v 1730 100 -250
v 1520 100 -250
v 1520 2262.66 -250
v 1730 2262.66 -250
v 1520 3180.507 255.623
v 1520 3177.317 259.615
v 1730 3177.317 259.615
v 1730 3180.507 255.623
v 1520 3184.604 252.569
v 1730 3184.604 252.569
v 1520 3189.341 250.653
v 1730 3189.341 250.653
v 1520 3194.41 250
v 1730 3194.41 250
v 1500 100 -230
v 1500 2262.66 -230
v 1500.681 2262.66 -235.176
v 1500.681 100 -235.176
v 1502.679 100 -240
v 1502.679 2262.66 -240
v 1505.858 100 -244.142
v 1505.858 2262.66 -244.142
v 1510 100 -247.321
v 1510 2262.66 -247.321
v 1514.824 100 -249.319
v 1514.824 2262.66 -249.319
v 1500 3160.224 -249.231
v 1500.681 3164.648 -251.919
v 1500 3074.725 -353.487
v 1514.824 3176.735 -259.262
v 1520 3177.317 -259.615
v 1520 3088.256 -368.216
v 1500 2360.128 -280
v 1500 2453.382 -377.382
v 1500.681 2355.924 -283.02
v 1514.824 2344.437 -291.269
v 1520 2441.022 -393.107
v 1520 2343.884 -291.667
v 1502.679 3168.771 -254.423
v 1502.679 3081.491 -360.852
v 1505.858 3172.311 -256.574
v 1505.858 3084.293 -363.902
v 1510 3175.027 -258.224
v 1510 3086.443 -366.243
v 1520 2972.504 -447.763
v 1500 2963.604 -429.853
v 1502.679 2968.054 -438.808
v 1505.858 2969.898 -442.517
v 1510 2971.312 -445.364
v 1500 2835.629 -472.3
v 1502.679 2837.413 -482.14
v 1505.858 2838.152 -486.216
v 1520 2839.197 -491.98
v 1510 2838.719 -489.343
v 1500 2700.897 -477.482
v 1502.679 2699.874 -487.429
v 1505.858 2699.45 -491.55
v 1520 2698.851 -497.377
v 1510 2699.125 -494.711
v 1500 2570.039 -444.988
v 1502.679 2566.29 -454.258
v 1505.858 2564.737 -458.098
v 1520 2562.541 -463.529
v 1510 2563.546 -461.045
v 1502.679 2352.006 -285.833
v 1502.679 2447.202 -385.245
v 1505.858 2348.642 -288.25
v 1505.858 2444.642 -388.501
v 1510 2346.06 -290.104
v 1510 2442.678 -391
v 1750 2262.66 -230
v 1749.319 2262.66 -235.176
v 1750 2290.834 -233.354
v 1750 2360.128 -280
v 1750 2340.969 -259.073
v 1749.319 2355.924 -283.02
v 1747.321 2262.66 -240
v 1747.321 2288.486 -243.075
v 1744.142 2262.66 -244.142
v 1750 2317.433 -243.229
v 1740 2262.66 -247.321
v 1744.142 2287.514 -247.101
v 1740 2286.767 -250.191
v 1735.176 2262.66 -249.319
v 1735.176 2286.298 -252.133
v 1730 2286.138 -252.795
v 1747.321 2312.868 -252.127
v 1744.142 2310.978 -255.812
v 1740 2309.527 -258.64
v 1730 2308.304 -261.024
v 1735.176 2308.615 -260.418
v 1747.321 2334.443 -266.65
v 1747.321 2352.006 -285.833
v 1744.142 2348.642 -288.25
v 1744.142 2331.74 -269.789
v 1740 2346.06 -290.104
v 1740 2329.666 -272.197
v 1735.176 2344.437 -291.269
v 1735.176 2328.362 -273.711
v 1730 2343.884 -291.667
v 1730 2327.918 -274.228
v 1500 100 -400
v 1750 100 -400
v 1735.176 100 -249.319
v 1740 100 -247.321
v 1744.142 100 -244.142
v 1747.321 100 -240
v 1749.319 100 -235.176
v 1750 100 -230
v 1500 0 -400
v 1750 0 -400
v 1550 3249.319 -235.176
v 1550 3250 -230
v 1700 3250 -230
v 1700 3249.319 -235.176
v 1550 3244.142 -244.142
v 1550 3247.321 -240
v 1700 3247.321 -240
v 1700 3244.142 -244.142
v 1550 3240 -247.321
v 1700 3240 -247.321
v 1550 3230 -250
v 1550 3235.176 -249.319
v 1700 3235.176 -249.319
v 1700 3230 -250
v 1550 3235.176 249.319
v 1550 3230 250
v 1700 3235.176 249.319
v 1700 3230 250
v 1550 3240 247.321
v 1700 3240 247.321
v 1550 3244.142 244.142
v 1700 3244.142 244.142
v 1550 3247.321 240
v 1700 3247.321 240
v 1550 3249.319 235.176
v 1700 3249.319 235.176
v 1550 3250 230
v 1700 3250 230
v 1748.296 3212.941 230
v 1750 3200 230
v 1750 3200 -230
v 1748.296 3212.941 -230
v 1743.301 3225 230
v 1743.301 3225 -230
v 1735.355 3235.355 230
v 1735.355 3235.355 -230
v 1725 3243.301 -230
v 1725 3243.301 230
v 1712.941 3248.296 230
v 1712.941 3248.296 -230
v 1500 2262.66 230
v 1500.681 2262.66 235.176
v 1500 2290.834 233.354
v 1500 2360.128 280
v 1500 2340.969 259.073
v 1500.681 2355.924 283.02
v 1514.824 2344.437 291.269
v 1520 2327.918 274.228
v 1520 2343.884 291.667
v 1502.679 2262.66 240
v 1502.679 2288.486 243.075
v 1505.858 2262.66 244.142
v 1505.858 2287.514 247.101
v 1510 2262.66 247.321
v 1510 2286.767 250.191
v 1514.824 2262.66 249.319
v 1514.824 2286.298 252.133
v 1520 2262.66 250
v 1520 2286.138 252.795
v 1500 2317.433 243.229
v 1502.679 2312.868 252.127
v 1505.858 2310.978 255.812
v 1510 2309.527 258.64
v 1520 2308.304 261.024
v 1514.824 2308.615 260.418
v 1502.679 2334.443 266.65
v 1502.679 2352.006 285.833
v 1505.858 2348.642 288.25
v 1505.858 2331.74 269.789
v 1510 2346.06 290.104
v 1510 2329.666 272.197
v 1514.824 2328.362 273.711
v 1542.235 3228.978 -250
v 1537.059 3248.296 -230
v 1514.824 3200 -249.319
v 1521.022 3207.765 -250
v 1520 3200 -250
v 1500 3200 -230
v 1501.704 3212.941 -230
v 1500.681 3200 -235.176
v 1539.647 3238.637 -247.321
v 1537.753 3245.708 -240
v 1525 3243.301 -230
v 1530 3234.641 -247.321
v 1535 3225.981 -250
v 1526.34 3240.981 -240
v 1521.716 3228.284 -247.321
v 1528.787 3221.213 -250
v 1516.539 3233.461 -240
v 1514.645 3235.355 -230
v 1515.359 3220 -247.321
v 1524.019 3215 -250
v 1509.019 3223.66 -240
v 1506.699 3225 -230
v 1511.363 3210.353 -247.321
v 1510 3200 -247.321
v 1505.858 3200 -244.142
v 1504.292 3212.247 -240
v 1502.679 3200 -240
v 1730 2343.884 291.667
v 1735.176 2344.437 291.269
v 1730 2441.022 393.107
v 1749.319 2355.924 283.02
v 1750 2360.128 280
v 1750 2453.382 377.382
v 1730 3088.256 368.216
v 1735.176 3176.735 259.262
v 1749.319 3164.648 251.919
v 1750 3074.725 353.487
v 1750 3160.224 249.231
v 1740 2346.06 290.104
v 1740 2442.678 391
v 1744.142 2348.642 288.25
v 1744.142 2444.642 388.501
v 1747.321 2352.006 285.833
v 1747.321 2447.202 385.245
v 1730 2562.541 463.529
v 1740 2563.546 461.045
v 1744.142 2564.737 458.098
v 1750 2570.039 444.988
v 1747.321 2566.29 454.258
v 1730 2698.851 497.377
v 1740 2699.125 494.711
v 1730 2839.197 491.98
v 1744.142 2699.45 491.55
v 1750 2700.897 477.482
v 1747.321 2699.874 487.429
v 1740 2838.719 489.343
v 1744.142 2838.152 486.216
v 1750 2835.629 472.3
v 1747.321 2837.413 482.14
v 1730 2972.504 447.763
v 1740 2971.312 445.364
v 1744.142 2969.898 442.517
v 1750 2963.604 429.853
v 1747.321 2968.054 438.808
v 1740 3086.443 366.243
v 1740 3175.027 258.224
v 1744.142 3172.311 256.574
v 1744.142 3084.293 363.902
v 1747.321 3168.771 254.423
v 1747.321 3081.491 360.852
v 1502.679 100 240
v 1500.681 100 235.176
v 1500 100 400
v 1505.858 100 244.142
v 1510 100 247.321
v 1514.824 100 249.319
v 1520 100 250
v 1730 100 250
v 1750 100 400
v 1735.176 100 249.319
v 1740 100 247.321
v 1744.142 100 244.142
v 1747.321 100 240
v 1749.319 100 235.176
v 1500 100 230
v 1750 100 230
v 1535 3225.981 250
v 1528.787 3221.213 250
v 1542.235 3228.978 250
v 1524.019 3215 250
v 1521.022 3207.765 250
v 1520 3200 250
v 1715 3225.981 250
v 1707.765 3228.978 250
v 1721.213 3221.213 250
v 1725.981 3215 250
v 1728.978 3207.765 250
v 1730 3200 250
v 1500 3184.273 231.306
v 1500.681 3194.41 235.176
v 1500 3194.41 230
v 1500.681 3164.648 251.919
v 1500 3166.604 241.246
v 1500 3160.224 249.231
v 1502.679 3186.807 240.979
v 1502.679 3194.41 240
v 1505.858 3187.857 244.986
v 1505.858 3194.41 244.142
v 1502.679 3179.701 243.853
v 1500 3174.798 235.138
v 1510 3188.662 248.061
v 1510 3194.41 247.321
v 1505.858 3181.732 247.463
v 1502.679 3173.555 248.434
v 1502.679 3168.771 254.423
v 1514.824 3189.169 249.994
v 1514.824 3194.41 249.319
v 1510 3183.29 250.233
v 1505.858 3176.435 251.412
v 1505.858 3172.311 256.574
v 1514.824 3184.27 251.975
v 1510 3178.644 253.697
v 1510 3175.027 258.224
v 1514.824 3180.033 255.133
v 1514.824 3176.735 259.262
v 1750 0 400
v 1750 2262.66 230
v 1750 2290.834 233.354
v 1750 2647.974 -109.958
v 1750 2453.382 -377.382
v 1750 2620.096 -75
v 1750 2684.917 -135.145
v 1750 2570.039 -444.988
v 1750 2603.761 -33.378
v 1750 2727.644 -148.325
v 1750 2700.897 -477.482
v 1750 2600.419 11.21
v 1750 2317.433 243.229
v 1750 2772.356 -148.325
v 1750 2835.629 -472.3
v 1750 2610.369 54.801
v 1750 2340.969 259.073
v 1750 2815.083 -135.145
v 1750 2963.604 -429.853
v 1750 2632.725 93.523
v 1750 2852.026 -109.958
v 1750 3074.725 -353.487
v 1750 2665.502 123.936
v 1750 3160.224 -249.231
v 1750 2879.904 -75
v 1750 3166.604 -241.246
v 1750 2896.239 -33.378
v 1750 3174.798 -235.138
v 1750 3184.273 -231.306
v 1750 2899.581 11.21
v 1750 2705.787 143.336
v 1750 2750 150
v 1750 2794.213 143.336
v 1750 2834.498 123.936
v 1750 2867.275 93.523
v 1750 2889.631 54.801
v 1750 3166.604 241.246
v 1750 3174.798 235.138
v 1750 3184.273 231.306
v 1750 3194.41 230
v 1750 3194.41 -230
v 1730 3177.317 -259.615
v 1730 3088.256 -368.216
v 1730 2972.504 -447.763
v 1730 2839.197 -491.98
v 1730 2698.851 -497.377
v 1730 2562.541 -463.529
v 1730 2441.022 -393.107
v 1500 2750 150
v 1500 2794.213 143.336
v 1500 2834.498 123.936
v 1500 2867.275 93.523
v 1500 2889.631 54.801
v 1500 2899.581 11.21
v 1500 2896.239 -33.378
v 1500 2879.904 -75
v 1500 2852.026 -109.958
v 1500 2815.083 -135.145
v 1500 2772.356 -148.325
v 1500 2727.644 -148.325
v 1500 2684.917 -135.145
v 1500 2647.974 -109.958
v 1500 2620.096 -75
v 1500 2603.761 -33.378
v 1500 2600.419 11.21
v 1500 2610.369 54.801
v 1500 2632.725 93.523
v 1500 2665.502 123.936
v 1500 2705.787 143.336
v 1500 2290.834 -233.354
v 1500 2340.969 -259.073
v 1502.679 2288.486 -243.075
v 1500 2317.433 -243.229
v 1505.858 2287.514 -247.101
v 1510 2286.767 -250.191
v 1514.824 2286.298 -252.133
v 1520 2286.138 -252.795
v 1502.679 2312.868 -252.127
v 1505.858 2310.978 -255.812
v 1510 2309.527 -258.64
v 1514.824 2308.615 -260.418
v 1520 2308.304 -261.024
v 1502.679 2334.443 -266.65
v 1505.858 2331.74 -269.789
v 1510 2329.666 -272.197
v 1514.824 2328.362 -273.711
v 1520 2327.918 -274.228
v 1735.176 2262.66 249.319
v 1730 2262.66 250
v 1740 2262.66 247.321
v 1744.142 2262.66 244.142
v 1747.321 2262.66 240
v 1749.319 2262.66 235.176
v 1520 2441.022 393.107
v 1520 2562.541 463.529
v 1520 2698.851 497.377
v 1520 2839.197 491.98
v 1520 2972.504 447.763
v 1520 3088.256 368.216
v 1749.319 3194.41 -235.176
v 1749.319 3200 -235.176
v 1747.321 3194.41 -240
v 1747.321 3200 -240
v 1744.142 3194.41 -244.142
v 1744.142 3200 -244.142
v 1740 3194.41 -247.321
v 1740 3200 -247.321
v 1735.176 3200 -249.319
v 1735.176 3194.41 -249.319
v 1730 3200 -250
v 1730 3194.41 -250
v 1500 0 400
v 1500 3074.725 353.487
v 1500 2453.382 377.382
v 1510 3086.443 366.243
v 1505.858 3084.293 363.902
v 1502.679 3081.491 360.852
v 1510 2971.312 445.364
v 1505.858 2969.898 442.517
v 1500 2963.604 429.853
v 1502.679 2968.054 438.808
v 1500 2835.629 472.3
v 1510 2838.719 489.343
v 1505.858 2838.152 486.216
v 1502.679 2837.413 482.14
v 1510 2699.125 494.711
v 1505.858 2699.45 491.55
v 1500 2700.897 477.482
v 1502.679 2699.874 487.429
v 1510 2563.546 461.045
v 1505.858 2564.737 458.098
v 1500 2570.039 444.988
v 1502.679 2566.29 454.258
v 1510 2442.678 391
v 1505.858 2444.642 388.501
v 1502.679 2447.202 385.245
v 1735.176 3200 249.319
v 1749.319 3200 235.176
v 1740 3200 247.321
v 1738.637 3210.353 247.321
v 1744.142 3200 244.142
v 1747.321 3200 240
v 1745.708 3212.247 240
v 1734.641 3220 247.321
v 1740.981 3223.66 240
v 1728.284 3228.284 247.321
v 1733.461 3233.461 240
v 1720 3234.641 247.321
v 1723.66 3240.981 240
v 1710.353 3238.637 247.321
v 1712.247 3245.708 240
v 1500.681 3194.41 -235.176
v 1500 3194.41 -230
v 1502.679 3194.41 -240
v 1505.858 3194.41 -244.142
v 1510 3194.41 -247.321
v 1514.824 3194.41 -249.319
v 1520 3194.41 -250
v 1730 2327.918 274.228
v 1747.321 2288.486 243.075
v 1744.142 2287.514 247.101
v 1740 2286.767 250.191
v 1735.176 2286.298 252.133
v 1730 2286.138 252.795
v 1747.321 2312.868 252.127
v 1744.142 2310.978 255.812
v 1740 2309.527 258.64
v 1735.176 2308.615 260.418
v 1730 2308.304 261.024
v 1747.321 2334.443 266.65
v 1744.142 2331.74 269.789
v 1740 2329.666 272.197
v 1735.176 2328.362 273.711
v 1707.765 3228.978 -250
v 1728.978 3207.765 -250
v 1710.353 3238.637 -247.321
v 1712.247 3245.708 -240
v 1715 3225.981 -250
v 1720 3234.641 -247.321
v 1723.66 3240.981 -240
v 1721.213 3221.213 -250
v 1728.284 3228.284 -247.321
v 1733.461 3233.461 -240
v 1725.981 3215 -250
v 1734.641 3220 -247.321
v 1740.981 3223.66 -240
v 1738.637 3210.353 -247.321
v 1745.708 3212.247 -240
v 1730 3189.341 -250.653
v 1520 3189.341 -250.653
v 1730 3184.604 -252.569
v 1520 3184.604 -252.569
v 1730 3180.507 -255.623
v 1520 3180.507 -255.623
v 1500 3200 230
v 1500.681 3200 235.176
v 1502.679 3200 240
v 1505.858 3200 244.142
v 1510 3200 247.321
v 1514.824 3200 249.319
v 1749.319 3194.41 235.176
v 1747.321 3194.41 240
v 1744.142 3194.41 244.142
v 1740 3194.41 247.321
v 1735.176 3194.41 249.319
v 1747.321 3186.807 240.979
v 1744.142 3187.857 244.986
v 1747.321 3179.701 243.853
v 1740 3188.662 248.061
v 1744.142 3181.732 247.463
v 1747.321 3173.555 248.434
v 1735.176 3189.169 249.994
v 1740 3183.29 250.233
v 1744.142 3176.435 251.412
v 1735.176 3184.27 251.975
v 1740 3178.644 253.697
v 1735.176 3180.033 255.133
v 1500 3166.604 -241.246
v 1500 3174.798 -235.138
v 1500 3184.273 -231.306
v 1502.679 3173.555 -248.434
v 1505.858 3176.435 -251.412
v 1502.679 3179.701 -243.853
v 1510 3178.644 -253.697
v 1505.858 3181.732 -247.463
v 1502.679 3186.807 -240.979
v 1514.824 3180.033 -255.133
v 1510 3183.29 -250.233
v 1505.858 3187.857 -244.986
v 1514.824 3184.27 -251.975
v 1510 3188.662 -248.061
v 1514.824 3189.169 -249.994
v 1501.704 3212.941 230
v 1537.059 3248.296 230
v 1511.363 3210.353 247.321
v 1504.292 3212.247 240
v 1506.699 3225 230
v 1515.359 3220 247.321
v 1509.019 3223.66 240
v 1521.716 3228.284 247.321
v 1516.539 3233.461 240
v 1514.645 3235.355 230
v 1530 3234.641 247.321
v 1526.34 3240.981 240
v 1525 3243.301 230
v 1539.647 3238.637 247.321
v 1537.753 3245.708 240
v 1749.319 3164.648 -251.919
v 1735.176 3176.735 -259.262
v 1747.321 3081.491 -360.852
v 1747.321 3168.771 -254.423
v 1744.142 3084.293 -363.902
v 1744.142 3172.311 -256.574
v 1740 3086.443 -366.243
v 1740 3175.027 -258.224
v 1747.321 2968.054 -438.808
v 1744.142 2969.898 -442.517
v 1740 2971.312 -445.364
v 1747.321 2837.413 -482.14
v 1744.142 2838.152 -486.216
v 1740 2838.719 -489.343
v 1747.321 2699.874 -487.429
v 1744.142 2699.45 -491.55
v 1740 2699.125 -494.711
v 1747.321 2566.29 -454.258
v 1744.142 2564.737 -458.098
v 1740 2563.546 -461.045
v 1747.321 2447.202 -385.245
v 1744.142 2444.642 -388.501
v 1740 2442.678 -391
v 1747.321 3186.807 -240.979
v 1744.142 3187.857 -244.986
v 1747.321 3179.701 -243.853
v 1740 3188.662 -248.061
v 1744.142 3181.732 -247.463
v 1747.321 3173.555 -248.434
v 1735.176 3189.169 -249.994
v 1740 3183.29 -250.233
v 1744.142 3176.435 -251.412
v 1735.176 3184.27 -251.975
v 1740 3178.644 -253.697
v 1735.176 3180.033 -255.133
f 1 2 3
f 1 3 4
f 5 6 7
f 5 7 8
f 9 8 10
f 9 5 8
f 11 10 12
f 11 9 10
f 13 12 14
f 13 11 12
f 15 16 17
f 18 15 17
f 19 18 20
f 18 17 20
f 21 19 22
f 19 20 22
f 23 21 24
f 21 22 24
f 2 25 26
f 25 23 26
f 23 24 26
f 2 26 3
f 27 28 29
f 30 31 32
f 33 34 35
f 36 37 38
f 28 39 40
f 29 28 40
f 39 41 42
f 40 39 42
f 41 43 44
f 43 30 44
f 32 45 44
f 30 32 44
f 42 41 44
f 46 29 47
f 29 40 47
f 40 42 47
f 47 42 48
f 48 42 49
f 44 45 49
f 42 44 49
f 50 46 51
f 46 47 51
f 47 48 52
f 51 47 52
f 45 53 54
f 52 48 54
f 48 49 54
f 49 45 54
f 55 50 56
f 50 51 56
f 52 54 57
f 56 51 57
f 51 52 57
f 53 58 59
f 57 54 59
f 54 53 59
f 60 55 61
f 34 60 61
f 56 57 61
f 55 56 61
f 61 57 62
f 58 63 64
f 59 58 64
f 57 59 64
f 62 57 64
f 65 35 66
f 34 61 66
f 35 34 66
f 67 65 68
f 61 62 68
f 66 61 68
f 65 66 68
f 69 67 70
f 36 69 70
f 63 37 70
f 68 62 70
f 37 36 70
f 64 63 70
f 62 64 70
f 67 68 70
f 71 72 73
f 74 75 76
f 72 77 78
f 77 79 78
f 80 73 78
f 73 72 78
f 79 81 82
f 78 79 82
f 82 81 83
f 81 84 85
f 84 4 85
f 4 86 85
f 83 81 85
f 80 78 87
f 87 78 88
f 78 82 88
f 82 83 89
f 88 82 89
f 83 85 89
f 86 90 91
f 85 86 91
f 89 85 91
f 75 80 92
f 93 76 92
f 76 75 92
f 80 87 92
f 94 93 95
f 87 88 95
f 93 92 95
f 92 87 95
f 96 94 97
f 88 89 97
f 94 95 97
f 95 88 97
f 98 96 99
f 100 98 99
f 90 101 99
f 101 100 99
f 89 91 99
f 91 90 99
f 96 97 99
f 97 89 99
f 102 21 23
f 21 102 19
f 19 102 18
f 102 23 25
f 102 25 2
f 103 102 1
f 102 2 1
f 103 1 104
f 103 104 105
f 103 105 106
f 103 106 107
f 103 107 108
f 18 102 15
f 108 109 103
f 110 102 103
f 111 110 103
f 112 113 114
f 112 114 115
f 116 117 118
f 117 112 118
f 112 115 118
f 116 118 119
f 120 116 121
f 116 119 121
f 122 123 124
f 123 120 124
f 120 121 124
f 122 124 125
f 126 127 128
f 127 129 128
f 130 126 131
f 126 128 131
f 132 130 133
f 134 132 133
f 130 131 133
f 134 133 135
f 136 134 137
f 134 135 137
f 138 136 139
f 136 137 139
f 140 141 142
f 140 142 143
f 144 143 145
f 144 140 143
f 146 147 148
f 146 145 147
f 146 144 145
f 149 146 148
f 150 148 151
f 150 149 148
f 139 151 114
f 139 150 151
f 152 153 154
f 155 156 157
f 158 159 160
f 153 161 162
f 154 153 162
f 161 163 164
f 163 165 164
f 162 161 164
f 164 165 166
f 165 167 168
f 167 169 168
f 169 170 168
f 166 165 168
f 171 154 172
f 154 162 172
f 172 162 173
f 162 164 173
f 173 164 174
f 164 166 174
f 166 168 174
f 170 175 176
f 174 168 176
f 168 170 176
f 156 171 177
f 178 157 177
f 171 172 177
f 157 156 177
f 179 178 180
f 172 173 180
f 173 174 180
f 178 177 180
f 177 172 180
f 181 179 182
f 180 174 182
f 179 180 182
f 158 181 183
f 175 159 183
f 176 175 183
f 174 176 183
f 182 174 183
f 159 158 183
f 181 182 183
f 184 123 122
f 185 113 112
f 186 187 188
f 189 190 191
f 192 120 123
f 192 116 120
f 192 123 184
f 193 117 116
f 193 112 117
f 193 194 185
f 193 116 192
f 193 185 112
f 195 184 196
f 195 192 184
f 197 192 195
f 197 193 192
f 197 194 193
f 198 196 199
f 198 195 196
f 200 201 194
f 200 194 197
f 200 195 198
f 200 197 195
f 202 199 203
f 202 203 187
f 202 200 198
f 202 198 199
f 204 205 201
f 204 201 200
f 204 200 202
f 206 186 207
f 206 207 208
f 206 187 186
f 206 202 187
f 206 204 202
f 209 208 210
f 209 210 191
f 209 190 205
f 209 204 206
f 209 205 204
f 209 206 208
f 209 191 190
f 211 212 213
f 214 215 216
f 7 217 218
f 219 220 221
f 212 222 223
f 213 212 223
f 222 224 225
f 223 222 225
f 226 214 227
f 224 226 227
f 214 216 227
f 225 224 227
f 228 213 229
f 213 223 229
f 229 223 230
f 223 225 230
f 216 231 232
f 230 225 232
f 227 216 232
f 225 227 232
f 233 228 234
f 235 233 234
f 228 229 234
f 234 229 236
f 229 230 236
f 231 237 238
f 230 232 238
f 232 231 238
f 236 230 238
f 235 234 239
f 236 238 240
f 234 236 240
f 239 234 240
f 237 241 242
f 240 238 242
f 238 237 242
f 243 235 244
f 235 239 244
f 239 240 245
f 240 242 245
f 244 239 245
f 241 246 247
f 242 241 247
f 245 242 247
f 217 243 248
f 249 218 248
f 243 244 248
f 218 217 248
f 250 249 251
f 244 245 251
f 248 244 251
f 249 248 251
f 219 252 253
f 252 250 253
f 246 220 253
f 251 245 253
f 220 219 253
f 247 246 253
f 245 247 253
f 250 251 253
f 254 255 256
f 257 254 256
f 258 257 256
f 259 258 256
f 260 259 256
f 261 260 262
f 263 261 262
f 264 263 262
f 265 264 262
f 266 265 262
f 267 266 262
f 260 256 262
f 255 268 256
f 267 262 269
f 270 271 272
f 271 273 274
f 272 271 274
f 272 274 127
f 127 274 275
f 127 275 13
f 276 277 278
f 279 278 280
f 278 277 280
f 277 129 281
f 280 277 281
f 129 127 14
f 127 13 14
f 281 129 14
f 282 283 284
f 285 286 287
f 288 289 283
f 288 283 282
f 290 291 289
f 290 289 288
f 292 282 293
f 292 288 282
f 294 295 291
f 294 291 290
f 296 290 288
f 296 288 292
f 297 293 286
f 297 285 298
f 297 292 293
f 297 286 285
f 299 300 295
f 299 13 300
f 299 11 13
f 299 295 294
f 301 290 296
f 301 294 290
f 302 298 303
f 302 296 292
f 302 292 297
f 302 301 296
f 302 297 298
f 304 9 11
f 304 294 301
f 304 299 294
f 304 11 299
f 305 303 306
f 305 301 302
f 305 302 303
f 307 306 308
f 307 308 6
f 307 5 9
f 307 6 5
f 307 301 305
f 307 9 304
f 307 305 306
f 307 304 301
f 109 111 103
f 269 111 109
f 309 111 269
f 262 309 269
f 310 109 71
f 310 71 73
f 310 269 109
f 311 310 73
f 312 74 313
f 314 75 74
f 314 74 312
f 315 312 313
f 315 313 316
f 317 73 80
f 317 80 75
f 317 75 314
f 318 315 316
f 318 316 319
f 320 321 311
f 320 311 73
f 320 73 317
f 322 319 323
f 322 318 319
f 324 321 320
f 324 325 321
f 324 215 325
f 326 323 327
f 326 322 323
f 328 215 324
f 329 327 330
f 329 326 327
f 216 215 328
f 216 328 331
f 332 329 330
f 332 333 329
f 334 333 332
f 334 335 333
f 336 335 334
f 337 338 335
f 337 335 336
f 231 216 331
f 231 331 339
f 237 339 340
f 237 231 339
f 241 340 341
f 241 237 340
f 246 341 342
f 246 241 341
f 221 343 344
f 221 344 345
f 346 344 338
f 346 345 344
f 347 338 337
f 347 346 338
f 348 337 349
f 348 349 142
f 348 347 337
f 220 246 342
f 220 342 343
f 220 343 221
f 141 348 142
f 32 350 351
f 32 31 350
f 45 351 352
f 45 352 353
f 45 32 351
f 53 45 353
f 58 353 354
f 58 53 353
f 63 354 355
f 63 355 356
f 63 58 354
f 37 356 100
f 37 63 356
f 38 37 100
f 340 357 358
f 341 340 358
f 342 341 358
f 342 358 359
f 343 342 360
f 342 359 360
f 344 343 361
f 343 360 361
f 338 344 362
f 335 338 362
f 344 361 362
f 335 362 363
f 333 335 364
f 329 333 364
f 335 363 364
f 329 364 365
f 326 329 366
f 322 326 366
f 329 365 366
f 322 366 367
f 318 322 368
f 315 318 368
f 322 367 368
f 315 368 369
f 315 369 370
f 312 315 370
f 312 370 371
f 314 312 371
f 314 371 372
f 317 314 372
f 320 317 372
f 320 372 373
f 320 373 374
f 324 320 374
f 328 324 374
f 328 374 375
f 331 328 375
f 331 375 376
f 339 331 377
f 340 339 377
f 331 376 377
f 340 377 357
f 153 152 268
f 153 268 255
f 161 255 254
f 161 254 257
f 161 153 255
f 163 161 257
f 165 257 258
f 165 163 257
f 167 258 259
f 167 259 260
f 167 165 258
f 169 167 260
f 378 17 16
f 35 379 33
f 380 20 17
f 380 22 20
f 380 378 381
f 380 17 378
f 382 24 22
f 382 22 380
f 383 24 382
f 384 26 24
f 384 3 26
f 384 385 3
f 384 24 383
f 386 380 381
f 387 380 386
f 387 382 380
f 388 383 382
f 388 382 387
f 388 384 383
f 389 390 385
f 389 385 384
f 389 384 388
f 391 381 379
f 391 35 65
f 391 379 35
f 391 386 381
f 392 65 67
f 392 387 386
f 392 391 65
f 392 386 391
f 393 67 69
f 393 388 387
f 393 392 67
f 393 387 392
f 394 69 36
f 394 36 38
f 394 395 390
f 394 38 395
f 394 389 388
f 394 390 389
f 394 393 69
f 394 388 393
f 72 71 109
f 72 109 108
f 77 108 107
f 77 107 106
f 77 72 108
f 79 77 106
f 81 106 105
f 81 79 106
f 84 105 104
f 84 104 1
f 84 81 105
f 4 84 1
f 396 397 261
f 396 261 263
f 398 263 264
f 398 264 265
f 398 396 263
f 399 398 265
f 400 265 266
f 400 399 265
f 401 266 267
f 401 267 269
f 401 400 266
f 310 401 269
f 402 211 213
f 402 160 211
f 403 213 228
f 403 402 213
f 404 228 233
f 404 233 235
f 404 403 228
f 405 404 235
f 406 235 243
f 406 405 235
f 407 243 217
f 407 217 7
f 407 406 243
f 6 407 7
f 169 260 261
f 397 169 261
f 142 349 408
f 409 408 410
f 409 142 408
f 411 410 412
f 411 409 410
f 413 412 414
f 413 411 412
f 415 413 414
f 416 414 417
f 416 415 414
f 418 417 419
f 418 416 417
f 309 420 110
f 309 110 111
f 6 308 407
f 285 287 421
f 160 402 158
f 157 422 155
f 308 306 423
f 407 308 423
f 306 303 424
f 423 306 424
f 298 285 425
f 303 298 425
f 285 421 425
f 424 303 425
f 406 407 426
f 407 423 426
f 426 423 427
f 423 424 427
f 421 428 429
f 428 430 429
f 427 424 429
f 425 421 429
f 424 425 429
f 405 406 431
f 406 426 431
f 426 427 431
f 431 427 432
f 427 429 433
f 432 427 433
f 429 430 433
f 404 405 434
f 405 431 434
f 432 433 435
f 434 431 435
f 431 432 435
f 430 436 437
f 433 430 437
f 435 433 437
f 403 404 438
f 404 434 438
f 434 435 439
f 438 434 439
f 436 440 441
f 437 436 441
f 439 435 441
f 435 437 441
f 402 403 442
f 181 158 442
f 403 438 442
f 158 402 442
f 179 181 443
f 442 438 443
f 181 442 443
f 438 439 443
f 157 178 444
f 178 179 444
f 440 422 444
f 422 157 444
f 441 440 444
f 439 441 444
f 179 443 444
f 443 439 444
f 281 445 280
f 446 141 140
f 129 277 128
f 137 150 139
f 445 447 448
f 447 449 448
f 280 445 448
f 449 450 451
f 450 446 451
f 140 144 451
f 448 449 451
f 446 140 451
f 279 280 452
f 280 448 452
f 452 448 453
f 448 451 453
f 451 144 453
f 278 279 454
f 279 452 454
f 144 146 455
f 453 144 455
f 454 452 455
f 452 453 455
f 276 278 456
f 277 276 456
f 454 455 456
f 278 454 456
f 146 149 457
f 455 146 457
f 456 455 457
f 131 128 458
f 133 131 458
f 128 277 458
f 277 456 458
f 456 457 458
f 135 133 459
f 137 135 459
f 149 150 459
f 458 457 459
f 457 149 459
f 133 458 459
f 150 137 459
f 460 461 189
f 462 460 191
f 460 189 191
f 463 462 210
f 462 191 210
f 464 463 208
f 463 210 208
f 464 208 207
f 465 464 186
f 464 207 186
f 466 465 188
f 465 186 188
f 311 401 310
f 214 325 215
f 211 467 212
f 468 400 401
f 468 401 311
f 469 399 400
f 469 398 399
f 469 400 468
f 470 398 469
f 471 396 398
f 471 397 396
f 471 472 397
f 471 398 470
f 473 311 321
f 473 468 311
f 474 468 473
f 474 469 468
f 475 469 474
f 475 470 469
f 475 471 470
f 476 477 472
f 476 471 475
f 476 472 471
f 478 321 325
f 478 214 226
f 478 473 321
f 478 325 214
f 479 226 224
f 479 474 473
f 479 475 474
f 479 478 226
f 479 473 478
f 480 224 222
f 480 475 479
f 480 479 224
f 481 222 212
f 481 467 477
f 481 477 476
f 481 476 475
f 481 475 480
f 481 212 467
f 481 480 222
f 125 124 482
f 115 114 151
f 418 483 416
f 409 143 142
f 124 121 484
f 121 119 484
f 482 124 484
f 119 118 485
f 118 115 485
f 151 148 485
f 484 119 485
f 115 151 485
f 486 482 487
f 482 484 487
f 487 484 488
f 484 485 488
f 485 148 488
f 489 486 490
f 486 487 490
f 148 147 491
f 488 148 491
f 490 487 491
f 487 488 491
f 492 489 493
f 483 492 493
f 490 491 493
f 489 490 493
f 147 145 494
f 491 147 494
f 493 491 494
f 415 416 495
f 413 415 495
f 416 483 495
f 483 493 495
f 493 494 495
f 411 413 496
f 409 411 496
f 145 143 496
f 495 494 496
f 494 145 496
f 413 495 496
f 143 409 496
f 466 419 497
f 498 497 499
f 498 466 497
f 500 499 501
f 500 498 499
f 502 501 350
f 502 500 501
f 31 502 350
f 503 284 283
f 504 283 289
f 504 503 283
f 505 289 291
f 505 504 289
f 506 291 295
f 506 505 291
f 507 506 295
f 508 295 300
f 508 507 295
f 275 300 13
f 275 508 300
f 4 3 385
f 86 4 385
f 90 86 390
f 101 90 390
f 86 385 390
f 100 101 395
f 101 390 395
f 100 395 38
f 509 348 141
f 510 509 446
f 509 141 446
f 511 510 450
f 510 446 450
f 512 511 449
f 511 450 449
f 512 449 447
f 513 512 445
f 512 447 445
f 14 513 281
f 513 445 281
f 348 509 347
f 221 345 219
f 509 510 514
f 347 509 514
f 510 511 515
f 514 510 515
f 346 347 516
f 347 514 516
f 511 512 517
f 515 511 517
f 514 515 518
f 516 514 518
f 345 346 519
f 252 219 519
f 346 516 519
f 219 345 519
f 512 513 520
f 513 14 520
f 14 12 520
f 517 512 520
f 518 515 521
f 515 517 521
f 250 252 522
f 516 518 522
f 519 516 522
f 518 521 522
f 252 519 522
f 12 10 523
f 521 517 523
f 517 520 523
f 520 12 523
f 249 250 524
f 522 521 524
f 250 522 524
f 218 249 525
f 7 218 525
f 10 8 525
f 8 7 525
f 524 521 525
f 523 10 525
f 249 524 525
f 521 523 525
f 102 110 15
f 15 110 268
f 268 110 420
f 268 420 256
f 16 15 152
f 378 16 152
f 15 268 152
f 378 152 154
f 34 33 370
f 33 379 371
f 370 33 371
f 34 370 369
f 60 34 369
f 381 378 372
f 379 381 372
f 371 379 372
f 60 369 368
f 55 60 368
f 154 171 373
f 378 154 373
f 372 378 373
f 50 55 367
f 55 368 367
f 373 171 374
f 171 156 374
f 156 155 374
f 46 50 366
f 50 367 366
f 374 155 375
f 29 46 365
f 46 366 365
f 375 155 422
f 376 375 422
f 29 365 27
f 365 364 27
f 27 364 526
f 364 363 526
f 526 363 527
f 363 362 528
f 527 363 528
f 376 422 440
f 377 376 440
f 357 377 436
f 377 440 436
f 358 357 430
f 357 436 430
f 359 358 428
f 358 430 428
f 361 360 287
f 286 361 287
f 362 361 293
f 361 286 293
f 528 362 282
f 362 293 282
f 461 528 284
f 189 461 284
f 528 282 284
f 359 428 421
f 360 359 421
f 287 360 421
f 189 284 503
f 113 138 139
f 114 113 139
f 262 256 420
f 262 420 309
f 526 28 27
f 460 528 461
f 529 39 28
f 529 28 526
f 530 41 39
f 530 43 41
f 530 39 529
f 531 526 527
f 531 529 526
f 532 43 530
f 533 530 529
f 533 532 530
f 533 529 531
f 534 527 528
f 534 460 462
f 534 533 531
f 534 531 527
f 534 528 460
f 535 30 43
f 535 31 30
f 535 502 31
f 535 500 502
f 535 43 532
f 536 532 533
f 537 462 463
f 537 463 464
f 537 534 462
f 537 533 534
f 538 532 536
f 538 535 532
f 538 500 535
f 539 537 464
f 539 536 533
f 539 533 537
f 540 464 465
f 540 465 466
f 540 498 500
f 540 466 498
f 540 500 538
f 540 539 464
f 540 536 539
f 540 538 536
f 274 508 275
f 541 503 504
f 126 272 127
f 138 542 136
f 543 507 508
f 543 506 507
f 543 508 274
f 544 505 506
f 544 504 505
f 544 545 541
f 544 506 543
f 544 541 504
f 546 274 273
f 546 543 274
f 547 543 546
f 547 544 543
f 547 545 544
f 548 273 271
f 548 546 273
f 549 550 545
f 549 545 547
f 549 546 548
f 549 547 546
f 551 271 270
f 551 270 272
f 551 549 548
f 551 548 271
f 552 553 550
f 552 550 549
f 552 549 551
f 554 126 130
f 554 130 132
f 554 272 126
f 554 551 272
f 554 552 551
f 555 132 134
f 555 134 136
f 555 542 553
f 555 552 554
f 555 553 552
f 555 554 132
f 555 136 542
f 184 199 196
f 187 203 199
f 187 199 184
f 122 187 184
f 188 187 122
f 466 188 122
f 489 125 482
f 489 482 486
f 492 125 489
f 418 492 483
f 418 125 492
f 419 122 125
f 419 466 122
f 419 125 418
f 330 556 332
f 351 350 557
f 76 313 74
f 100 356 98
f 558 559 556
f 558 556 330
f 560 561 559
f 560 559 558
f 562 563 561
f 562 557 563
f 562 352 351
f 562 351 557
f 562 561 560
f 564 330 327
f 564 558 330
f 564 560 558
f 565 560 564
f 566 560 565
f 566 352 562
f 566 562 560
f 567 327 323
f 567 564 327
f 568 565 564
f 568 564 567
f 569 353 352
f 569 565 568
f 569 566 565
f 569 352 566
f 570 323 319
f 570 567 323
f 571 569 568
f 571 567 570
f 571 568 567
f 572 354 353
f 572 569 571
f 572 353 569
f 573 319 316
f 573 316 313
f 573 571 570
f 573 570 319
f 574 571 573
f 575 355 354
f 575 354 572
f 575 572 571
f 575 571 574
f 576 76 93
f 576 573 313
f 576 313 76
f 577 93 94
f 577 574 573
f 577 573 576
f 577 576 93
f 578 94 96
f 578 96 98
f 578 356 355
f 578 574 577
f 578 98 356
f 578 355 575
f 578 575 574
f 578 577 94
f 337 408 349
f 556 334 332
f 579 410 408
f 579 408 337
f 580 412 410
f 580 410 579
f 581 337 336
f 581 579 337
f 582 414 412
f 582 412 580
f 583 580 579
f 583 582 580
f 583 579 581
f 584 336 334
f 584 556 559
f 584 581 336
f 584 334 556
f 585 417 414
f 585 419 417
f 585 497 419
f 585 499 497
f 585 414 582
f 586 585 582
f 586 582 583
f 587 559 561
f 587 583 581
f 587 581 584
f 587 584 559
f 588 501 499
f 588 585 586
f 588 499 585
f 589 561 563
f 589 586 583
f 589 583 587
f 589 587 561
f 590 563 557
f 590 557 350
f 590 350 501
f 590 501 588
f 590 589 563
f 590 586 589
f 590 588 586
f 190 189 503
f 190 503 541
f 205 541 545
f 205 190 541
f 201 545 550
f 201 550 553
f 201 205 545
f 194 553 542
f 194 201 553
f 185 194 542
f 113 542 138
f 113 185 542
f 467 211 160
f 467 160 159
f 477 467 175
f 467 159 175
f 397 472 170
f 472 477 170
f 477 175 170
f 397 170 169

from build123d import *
from OCP.BRepFilletAPI import BRepFilletAPI_MakeFillet

# Parameters (mm, degrees)
SKETCH4_W           = 250
SKETCH4_H           = 500
BOSS_EXTRUDE3_DEPTH = 3250
SKETCH7_R           = 500
BOSS_EXTRUDE4_DEPTH = 250
SKETCH8_R           = 150
CUT_EXTRUDE1_DEPTH  = 250
FILLET1_R1          = 20
FILLET1_R2          = 50
FILLET1_R3          = 100
SKETCH10_W          = 250
SKETCH10_H          = 100
BOSS_EXTRUDE5_DEPTH = 400


with BuildPart() as part:
    # Sketch4 → Boss-Extrude3 (new body)
    with BuildSketch(Plane(origin=(0, 0, 0), x_dir=(1, 0, 0), z_dir=(0, 1, 0))):
        with Locations((1625, 0)):
            Rectangle(SKETCH4_W, SKETCH4_H)
    extrude(amount=BOSS_EXTRUDE3_DEPTH)

    # Sketch7 → Boss-Extrude4 (add)
    with BuildSketch(Plane.ZY.offset(-1500)):
        with Locations((0, 2750)):
            Circle(SKETCH7_R)
    extrude(amount=-BOSS_EXTRUDE4_DEPTH)

    # Sketch8 → Cut-Extrude1 (cut)
    with BuildSketch(Plane.ZY.offset(-1500)):
        with Locations((0, 2750)):
            Circle(SKETCH8_R)
    extrude(amount=-CUT_EXTRUDE1_DEPTH, mode=Mode.SUBTRACT)

    # Fillet1: one fillet with a radius per group of edges: ONE call of the kernel's fillet builder (fillet() takes one radius for all edges)
    fillet1_edges_1 = [part.edges().sort_by_distance(p)[0] for p in [
        (1500, 1158.493649054, -250),
        (1625, 3250, -250),
        (1750, 1158.493649054, -250),
        (1750, 1158.493649054, 250),
        (1500, 1158.493649054, 250),
        (1750, 2750, 500),
        (1750, 2750, -500),
        (1625, 3183.012701892, -250),
        (1500, 2750, 500),
        (1500, 2750, -500),
        (1625, 3183.012701892, 250),
        (1500, 3216.506350946, -250),
        (1750, 3216.506350946, -250),
        (1750, 3216.506350946, 250),
        (1500, 3216.506350946, 250),
        (1625, 3250, 250),
    ]]
    fillet1_edges_2 = [part.edges().sort_by_distance(p)[0] for p in [
        (1750, 3250, 0),
        (1500, 3250, 0),
    ]]
    fillet1_edges_3 = [part.edges().sort_by_distance(p)[0] for p in [
        (1625, 2316.987298108, 250),
        (1625, 2316.987298108, -250),
    ]]
    fillet1 = BRepFilletAPI_MakeFillet(part.part.solid().wrapped)
    for e in fillet1_edges_1:
        fillet1.Add(FILLET1_R1, e.wrapped)
    for e in fillet1_edges_2:
        fillet1.Add(FILLET1_R2, e.wrapped)
    for e in fillet1_edges_3:
        fillet1.Add(FILLET1_R3, e.wrapped)
    add(Compound.cast(fillet1.Shape()), mode=Mode.REPLACE)

    # Sketch10 → Boss-Extrude5 (add, symmetric)
    with BuildSketch(Plane.XY):
        with Locations((1625, 50)):
            Rectangle(SKETCH10_W, SKETCH10_H)
    extrude(amount=BOSS_EXTRUDE5_DEPTH, both=True)


solid = part.part
